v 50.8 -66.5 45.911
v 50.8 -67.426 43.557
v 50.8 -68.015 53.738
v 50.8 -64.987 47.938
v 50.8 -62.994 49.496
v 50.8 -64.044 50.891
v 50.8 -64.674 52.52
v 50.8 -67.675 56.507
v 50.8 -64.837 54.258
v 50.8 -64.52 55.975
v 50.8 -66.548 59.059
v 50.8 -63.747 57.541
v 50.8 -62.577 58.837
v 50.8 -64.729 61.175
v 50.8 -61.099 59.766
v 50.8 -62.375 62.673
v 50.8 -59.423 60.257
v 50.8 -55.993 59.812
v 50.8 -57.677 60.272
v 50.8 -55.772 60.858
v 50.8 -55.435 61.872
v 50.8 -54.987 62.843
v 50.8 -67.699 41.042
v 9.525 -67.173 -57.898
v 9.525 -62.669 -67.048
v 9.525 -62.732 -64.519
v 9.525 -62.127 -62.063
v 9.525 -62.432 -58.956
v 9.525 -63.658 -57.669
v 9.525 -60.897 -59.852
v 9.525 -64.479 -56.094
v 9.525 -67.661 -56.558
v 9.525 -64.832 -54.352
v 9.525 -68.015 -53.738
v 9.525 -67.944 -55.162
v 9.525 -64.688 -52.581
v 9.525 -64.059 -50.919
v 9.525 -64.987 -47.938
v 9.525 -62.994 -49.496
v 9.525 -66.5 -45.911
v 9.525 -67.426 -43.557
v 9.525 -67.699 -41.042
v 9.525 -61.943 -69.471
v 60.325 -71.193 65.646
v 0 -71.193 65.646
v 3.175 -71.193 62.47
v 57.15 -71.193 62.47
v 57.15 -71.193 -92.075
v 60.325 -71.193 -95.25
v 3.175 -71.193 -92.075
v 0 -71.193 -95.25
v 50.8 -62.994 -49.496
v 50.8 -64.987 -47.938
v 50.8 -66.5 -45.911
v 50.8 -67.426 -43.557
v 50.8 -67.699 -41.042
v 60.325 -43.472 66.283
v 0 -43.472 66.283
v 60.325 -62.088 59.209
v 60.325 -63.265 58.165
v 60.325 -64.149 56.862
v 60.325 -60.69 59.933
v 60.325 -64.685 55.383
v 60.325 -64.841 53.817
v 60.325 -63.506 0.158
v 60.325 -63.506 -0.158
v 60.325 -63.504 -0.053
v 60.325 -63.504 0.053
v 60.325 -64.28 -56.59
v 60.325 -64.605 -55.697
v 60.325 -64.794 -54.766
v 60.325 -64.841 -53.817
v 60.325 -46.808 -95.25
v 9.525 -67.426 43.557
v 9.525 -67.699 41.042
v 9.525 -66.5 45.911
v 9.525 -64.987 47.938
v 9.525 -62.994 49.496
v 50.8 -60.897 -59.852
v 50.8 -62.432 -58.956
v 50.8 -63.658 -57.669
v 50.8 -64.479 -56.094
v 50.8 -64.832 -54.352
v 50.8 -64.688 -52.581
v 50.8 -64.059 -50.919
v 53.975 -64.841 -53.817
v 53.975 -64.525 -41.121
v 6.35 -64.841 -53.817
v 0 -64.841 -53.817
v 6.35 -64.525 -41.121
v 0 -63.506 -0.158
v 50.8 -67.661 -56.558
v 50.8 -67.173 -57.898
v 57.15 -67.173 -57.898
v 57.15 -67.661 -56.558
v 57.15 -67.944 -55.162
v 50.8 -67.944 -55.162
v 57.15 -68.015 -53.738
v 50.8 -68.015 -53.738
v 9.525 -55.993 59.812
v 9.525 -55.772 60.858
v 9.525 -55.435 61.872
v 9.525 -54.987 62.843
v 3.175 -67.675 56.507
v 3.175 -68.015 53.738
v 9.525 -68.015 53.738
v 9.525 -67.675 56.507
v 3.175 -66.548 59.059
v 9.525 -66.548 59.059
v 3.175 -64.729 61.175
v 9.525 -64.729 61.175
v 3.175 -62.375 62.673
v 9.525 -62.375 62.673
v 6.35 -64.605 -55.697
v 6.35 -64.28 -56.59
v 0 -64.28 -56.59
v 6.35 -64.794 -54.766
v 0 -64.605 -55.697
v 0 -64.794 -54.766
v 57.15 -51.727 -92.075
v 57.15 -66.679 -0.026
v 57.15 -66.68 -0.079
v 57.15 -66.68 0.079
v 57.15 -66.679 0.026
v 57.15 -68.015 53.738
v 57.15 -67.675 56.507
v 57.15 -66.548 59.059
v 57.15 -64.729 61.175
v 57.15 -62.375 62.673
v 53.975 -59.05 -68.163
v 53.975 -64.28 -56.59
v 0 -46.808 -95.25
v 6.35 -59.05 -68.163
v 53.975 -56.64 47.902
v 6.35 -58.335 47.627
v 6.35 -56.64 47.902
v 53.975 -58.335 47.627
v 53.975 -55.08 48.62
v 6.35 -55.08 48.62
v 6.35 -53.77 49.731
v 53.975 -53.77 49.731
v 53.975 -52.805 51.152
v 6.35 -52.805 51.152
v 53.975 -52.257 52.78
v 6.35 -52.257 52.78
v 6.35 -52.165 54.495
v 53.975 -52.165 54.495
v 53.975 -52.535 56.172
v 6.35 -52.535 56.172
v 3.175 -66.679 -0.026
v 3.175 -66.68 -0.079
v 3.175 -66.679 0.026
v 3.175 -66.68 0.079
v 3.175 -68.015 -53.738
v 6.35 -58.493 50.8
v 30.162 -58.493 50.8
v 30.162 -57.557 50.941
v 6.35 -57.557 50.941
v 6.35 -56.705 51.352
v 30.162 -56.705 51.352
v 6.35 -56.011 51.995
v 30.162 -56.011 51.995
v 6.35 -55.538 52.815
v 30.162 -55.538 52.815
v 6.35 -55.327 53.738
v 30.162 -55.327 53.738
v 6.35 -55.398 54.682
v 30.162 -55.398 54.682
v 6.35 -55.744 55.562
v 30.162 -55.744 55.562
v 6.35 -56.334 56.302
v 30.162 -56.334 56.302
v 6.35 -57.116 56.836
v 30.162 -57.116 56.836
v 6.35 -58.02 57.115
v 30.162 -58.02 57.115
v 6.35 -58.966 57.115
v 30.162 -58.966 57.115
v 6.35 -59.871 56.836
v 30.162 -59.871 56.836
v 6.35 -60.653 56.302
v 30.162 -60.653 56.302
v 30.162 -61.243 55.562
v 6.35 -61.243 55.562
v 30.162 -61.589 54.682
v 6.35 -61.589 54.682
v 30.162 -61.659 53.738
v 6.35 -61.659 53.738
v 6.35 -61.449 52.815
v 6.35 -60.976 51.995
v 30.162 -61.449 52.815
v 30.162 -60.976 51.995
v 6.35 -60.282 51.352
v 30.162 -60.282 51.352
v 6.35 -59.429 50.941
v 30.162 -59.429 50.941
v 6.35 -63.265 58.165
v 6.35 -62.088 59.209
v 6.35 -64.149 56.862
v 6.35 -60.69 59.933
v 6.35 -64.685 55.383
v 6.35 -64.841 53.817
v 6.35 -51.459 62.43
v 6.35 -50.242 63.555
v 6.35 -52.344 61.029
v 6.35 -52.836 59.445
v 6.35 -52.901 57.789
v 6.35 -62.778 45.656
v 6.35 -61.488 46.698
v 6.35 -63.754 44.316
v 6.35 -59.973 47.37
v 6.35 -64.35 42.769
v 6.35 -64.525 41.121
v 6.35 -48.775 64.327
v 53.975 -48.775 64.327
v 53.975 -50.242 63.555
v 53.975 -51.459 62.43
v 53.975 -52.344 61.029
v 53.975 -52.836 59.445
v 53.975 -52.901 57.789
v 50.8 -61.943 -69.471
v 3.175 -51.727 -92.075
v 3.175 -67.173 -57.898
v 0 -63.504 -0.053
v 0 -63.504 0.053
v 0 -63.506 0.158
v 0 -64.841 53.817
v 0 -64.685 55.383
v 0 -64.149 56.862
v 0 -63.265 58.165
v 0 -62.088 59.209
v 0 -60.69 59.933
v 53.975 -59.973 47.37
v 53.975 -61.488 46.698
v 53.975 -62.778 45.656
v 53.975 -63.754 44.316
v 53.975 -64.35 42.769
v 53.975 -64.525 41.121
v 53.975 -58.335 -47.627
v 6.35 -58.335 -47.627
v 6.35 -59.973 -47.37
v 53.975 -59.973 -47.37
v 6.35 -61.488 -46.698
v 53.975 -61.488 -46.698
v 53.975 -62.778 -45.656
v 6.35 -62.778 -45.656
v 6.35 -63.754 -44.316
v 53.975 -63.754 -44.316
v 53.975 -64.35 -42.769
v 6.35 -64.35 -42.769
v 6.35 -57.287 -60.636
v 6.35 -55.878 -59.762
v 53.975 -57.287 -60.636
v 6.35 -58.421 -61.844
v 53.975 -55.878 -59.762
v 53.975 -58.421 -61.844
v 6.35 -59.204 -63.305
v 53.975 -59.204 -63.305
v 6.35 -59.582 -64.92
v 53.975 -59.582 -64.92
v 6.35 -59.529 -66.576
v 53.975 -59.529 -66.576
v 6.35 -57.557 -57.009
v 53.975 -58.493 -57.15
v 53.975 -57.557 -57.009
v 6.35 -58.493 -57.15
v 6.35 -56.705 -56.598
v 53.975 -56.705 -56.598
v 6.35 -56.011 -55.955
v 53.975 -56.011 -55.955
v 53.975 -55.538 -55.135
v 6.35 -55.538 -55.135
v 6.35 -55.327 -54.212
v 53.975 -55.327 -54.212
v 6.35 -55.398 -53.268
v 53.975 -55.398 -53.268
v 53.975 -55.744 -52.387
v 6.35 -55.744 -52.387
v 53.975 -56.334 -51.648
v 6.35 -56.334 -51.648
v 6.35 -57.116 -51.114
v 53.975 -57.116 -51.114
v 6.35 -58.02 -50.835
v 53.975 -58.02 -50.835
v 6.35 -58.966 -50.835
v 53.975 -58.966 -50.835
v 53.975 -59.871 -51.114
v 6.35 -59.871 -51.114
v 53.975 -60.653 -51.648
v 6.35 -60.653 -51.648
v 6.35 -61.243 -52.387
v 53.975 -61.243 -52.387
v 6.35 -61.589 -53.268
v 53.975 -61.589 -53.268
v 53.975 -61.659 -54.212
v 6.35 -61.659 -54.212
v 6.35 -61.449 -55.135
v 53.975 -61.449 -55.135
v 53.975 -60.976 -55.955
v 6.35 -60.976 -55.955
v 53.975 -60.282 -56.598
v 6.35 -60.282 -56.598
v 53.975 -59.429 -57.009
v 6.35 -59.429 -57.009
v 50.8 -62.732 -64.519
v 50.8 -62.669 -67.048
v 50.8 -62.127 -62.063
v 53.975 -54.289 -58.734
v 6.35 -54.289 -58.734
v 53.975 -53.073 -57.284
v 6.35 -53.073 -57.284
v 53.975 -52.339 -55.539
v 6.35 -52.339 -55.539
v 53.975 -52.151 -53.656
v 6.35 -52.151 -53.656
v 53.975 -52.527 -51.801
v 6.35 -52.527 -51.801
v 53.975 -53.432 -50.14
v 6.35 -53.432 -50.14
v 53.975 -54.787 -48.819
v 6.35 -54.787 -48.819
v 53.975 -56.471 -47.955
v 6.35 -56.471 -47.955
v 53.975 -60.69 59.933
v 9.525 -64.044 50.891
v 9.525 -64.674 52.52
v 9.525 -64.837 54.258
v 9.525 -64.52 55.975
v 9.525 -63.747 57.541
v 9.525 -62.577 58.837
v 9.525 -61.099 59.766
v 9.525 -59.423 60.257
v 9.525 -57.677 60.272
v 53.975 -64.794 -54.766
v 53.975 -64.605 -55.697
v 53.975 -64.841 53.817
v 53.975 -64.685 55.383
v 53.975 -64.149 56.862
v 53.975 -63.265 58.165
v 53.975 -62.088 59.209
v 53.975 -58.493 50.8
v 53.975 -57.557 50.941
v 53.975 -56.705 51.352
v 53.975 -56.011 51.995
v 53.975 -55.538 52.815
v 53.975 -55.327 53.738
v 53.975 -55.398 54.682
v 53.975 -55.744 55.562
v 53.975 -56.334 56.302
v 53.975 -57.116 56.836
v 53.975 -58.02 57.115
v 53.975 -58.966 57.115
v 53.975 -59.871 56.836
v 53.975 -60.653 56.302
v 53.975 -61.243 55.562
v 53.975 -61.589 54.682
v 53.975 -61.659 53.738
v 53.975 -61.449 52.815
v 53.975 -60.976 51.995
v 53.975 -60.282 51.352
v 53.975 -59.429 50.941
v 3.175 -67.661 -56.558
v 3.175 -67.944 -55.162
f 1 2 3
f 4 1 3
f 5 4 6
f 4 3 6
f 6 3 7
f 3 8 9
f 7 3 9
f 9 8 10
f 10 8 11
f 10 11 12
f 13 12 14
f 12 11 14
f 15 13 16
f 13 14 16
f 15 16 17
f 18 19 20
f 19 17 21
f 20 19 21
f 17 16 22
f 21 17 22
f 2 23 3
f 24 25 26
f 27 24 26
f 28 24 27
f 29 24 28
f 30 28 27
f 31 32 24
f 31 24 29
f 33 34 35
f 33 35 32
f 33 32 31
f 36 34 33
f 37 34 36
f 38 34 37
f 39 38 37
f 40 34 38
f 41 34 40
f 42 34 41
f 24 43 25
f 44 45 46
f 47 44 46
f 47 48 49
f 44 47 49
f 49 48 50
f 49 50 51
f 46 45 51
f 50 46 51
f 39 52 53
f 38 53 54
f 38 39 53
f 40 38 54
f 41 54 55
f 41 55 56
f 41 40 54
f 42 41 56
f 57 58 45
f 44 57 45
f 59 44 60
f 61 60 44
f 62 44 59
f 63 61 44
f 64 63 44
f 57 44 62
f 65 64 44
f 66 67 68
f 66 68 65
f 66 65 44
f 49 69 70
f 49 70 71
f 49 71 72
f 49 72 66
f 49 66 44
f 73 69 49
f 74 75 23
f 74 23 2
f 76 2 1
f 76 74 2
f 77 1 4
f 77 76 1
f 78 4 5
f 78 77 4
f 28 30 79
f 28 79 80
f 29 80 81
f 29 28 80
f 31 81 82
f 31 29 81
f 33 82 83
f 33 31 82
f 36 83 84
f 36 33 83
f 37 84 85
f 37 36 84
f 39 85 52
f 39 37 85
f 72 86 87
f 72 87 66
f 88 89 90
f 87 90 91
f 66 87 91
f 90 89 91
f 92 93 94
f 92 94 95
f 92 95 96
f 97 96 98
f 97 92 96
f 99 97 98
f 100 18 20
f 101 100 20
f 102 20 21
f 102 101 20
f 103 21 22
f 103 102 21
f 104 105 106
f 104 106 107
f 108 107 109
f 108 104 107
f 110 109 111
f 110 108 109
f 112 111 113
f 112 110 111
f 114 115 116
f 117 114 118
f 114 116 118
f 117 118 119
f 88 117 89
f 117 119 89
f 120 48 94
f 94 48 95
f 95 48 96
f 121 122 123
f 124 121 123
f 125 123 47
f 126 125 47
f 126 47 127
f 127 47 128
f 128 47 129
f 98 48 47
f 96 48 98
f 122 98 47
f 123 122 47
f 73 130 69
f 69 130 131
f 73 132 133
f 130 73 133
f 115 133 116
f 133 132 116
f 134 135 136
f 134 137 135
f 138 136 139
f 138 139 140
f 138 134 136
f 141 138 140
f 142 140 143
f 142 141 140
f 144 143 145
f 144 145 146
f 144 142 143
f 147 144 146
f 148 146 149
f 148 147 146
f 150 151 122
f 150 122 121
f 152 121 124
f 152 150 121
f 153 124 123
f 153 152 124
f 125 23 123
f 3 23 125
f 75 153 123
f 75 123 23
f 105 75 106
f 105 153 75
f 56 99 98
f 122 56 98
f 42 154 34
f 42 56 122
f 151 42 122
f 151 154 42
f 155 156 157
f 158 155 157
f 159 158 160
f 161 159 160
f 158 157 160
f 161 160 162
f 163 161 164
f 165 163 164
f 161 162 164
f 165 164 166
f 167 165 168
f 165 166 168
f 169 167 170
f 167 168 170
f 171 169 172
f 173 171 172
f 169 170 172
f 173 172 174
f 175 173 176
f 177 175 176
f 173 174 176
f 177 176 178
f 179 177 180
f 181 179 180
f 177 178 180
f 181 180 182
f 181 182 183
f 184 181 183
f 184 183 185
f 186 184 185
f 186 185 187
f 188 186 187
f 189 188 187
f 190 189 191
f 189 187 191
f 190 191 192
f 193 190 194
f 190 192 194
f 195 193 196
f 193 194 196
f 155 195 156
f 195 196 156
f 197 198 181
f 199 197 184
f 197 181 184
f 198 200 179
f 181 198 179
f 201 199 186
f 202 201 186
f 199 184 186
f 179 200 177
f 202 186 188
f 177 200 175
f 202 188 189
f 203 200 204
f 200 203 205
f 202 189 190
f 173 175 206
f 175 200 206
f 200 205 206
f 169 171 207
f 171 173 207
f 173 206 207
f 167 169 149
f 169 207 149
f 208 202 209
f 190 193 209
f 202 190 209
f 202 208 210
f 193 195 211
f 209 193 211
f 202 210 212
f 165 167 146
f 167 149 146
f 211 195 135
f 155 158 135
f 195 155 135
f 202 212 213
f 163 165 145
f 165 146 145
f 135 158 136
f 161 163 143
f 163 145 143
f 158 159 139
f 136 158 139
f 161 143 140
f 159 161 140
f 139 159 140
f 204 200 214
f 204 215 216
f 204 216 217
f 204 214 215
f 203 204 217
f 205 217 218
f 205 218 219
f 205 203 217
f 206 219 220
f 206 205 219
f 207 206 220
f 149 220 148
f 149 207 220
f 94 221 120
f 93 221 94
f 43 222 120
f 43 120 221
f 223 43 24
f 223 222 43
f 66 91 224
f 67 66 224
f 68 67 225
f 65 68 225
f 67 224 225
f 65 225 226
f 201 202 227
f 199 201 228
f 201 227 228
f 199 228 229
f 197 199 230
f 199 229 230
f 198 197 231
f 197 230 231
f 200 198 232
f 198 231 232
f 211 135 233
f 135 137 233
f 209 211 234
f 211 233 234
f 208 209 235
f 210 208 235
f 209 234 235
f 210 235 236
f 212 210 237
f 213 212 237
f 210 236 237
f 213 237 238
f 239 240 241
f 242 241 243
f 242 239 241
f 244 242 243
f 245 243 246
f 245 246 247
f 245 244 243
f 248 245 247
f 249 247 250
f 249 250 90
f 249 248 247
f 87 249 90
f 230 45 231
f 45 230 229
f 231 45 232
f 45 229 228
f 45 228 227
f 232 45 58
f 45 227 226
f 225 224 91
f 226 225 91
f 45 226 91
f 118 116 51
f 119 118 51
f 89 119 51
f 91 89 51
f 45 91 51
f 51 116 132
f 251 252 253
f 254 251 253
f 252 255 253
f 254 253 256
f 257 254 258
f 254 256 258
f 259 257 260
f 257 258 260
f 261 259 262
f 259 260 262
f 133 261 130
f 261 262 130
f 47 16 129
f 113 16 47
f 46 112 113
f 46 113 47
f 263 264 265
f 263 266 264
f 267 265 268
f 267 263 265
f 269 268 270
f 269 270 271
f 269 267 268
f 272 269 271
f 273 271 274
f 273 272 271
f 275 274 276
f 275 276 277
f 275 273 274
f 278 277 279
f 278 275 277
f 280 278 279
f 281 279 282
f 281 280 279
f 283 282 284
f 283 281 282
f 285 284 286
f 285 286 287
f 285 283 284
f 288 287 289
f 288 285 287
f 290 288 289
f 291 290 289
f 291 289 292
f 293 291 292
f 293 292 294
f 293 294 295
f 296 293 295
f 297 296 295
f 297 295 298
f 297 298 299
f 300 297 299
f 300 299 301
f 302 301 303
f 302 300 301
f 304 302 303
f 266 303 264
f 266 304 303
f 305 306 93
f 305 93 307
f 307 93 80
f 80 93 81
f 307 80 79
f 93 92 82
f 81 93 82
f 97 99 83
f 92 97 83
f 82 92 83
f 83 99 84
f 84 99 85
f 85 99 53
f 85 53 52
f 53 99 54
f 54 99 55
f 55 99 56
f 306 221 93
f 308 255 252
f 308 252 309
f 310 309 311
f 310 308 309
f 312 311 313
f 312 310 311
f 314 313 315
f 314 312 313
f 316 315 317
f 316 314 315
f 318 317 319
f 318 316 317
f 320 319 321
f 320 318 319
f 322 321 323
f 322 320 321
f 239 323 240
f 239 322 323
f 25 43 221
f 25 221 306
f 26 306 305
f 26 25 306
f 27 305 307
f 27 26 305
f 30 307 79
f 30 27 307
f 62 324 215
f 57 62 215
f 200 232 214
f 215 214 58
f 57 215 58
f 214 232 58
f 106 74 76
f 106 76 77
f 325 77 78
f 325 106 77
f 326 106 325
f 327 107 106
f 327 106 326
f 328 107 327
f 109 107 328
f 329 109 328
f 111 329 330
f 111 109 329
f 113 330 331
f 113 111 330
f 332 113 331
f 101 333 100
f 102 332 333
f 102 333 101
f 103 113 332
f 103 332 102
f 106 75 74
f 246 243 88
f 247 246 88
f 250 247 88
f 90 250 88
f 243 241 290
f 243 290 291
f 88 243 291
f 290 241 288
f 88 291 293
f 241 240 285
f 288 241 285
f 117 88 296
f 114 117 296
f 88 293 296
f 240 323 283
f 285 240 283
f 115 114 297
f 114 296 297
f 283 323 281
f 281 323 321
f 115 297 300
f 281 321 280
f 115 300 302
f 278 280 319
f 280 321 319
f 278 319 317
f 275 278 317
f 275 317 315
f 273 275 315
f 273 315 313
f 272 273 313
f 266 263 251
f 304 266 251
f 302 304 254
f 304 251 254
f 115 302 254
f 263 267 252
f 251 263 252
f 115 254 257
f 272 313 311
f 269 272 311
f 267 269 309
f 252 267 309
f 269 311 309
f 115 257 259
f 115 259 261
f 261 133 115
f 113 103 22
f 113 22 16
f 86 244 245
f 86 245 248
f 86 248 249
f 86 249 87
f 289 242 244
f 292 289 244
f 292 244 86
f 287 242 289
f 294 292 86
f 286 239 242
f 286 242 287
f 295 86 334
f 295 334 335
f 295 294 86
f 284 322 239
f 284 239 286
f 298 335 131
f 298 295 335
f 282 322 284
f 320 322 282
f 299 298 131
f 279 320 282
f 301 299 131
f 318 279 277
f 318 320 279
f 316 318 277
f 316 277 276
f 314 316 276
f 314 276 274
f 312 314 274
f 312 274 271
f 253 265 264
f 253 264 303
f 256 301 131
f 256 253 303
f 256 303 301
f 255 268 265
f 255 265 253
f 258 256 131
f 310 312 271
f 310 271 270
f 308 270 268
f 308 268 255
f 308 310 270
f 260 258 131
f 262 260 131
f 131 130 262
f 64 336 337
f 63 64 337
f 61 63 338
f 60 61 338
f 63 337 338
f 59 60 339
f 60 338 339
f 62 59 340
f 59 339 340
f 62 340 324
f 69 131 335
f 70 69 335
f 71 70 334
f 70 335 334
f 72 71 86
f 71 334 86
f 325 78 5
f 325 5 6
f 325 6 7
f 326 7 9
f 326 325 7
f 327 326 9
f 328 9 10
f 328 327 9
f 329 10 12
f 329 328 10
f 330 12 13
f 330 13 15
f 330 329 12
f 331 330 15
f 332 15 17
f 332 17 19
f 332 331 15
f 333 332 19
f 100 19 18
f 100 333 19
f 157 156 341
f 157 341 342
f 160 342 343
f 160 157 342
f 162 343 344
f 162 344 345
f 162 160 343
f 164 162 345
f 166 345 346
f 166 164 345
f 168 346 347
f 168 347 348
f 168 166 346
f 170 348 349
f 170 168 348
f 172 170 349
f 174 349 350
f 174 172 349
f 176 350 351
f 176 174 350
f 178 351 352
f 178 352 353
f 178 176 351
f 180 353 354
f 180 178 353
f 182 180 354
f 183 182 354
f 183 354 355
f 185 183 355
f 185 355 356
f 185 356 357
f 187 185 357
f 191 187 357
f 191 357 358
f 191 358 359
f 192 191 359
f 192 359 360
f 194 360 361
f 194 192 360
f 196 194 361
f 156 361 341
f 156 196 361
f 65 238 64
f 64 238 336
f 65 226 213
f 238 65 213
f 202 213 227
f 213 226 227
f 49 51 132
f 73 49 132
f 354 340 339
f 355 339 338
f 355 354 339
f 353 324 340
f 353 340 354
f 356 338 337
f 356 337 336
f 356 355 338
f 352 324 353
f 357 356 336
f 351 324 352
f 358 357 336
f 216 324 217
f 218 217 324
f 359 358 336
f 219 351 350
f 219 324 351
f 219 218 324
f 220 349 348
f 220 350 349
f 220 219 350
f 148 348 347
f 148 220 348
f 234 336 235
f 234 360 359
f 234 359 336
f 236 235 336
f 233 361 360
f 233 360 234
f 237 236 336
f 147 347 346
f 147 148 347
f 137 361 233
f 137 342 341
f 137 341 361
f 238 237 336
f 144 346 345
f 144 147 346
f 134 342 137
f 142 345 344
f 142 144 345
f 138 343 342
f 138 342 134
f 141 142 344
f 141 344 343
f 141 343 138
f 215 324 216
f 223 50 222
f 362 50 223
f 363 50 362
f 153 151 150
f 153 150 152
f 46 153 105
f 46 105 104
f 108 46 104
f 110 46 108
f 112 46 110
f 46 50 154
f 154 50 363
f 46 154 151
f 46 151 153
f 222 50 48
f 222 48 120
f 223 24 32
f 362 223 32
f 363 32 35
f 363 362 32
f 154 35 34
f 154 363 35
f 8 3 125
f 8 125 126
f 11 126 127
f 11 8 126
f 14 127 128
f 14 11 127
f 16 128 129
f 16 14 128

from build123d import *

# Parameters (mm, degrees)
BOSS_EXTRUDE1_DEPTH = 60.324999999999996
SKETCH2_R           = 6.349999999999996
SKETCH2_R_2         = 3.174999999999997
SKETCH2_R_3         = 6.350000000000003
BOSS_EXTRUDE2_DEPTH = 23.8125
FILLET1_R           = 6.35
SHELL1_START        = 3.175
SHELL1_DEPTH        = 53.975
SHELL1_START_2      = 9.525
SHELL1_2_DEPTH      = 41.275


# Read off the part's stored shape, not the designer's step: Shell1
with BuildPart() as part:
    # Sketch1 → Boss-Extrude1 (new body)
    with BuildSketch(Plane(origin=(0, 0, 0), x_dir=(0, 0, -1), z_dir=(1, 0, 0))):
        with BuildLine():
            Line((95.25, -46.808484128263686), (56.59005614988863, -64.27972260468273))
            ThreePointArc((56.59005614988863, -64.27972260468273), (55.235212183230196, -64.71688198003586), (53.81702677554687, -64.84122281357011))
            Line((53.81702677554687, -64.84122281357011), (0.1579732244523257, -63.50589713864123))
            ThreePointArc((0.1579732244523257, -63.50589713864123), (-7.8219e-13, -63.5039318313911), (-0.15797322445388826, -63.50589713864123))
            Line((-0.15797322445388826, -63.50589713864123), (-53.817026775546886, -64.84122281357013))
            ThreePointArc((-53.817026775546886, -64.84122281357013), (-57.54105224821803, -63.747307586818266), (-59.93275370705406, -60.69038423543624))
            Line((-59.93275370705406, -60.69038423543624), (-66.28275370705404, -43.47219611461599))
            Line((-66.28275370705404, -43.47219611461599), (-65.6463, -71.1931881208203))
            Line((-65.6463, -71.1931881208203), (95.25, -71.19318812082028))
            Line((95.25, -71.19318812082028), (95.25, -46.808484128263686))
        make_face()
    extrude(amount=BOSS_EXTRUDE1_DEPTH)

    # Sketch2 → Boss-Extrude2 (add, symmetric)
    # profile 1 of 2: a face of its own
    with BuildSketch(Plane(origin=(30.162499999999998, 0, 0), x_dir=(0, 0, -1), z_dir=(1, 0, 0))):
        with Locations((-53.975, -58.49318812082027)):
            Circle(SKETCH2_R)
        with Locations((-53.975, -58.49318812082027)):
            Circle(SKETCH2_R_2, mode=Mode.SUBTRACT)
    # profile 2 of 2: a face of its own
    with BuildSketch(Plane(origin=(30.162499999999998, 0, 0), x_dir=(0, 0, -1), z_dir=(1, 0, 0))):
        with Locations((53.97499999999999, -58.49318812082027)):
            Circle(SKETCH2_R_3)
        with Locations((53.97499999999999, -58.49318812082027)):
            Circle(SKETCH2_R_2, mode=Mode.SUBTRACT)
    extrude(amount=BOSS_EXTRUDE2_DEPTH, both=True)

    # Fillet1
    fillet1_edges = [part.edges().sort_by_distance(p)[0] for p in [
        (30.162499999999998, -60.69038423543624, 59.93275370705406),
        (30.162499999999998, -64.84122281357013, 53.817026775546886),
        (30.162499999999998, -64.27972260468273, -56.59005614988863),
        (30.162499999999998, -64.84122281357011, -53.81702677554687),
    ]]
    fillet(fillet1_edges, radius=FILLET1_R)

    # Shell1 outline → Shell1 (cut)
    with BuildSketch(Plane.YZ.offset(SHELL1_START)):
        with BuildLine():
            Line((-66.679914485, 0.078986612), (-68.01524016, 53.738040163))
            ThreePointArc((-68.01524016, 53.738040163), (-66.547807009, 59.059165573), (-62.375448989, 62.672912138))
            Line((-62.375448989, 62.672912138), (-71.193188121, 62.470463295))
            Line((-71.193188121, 62.470463295), (-71.193188121, -92.075))
            Line((-71.193188121, -92.075), (-51.727499707, -92.075))
            Line((-51.727499707, -92.075), (-67.172989847, -57.897584225))
            ThreePointArc((-67.172989847, -57.897584225), (-67.82872891, -55.865318275), (-68.01524016, -53.738040163))
            Line((-68.01524016, -53.738040163), (-66.679914485, -0.078986612))
            ThreePointArc((-66.679914485, -0.078986612), (-66.678931831, 0), (-66.679914485, 0.078986612))
        make_face()
    extrude(amount=SHELL1_DEPTH, mode=Mode.SUBTRACT)

    # Shell1 2 outline → Shell1 2 (cut)
    with BuildSketch(Plane.YZ.offset(SHELL1_START_2)):
        with BuildLine():
            ThreePointArc((-67.699293711, 41.041970778), (-66.500168266, 45.910832805), (-62.99442515, 49.496008461))
            ThreePointArc((-62.99442515, 49.496008461), (-63.747307587, 57.541052248), (-55.99280194, 59.811999995))
            ThreePointArc((-55.99280194, 59.811999995), (-55.617794314, 61.369720704), (-54.986992393, 62.842545699))
            Line((-54.986992393, 62.842545699), (-62.375448989, 62.672912138))
            ThreePointArc((-62.375448989, 62.672912138), (-66.547807009, 59.059165573), (-68.01524016, 53.738040163))
            Line((-68.01524016, 53.738040163), (-67.699293711, 41.041970778))
        make_face()
        with BuildLine():
            ThreePointArc((-62.99442515, -49.496008461), (-66.500168266, -45.910832805), (-67.699293711, -41.041970778))
            Line((-67.699293711, -41.041970778), (-68.01524016, -53.738040163))
            ThreePointArc((-68.01524016, -53.738040163), (-67.82872891, -55.865318275), (-67.172989847, -57.897584225))
            Line((-67.172989847, -57.897584225), (-61.942877547, -69.470653193))
            ThreePointArc((-61.942877547, -69.470653193), (-62.732304839, -64.518832939), (-60.897427959, -59.85225538))
            ThreePointArc((-60.897427959, -59.85225538), (-64.71688198, -55.235212183), (-62.99442515, -49.496008461))
        make_face()
    extrude(amount=SHELL1_2_DEPTH, mode=Mode.SUBTRACT)


solid = part.part
